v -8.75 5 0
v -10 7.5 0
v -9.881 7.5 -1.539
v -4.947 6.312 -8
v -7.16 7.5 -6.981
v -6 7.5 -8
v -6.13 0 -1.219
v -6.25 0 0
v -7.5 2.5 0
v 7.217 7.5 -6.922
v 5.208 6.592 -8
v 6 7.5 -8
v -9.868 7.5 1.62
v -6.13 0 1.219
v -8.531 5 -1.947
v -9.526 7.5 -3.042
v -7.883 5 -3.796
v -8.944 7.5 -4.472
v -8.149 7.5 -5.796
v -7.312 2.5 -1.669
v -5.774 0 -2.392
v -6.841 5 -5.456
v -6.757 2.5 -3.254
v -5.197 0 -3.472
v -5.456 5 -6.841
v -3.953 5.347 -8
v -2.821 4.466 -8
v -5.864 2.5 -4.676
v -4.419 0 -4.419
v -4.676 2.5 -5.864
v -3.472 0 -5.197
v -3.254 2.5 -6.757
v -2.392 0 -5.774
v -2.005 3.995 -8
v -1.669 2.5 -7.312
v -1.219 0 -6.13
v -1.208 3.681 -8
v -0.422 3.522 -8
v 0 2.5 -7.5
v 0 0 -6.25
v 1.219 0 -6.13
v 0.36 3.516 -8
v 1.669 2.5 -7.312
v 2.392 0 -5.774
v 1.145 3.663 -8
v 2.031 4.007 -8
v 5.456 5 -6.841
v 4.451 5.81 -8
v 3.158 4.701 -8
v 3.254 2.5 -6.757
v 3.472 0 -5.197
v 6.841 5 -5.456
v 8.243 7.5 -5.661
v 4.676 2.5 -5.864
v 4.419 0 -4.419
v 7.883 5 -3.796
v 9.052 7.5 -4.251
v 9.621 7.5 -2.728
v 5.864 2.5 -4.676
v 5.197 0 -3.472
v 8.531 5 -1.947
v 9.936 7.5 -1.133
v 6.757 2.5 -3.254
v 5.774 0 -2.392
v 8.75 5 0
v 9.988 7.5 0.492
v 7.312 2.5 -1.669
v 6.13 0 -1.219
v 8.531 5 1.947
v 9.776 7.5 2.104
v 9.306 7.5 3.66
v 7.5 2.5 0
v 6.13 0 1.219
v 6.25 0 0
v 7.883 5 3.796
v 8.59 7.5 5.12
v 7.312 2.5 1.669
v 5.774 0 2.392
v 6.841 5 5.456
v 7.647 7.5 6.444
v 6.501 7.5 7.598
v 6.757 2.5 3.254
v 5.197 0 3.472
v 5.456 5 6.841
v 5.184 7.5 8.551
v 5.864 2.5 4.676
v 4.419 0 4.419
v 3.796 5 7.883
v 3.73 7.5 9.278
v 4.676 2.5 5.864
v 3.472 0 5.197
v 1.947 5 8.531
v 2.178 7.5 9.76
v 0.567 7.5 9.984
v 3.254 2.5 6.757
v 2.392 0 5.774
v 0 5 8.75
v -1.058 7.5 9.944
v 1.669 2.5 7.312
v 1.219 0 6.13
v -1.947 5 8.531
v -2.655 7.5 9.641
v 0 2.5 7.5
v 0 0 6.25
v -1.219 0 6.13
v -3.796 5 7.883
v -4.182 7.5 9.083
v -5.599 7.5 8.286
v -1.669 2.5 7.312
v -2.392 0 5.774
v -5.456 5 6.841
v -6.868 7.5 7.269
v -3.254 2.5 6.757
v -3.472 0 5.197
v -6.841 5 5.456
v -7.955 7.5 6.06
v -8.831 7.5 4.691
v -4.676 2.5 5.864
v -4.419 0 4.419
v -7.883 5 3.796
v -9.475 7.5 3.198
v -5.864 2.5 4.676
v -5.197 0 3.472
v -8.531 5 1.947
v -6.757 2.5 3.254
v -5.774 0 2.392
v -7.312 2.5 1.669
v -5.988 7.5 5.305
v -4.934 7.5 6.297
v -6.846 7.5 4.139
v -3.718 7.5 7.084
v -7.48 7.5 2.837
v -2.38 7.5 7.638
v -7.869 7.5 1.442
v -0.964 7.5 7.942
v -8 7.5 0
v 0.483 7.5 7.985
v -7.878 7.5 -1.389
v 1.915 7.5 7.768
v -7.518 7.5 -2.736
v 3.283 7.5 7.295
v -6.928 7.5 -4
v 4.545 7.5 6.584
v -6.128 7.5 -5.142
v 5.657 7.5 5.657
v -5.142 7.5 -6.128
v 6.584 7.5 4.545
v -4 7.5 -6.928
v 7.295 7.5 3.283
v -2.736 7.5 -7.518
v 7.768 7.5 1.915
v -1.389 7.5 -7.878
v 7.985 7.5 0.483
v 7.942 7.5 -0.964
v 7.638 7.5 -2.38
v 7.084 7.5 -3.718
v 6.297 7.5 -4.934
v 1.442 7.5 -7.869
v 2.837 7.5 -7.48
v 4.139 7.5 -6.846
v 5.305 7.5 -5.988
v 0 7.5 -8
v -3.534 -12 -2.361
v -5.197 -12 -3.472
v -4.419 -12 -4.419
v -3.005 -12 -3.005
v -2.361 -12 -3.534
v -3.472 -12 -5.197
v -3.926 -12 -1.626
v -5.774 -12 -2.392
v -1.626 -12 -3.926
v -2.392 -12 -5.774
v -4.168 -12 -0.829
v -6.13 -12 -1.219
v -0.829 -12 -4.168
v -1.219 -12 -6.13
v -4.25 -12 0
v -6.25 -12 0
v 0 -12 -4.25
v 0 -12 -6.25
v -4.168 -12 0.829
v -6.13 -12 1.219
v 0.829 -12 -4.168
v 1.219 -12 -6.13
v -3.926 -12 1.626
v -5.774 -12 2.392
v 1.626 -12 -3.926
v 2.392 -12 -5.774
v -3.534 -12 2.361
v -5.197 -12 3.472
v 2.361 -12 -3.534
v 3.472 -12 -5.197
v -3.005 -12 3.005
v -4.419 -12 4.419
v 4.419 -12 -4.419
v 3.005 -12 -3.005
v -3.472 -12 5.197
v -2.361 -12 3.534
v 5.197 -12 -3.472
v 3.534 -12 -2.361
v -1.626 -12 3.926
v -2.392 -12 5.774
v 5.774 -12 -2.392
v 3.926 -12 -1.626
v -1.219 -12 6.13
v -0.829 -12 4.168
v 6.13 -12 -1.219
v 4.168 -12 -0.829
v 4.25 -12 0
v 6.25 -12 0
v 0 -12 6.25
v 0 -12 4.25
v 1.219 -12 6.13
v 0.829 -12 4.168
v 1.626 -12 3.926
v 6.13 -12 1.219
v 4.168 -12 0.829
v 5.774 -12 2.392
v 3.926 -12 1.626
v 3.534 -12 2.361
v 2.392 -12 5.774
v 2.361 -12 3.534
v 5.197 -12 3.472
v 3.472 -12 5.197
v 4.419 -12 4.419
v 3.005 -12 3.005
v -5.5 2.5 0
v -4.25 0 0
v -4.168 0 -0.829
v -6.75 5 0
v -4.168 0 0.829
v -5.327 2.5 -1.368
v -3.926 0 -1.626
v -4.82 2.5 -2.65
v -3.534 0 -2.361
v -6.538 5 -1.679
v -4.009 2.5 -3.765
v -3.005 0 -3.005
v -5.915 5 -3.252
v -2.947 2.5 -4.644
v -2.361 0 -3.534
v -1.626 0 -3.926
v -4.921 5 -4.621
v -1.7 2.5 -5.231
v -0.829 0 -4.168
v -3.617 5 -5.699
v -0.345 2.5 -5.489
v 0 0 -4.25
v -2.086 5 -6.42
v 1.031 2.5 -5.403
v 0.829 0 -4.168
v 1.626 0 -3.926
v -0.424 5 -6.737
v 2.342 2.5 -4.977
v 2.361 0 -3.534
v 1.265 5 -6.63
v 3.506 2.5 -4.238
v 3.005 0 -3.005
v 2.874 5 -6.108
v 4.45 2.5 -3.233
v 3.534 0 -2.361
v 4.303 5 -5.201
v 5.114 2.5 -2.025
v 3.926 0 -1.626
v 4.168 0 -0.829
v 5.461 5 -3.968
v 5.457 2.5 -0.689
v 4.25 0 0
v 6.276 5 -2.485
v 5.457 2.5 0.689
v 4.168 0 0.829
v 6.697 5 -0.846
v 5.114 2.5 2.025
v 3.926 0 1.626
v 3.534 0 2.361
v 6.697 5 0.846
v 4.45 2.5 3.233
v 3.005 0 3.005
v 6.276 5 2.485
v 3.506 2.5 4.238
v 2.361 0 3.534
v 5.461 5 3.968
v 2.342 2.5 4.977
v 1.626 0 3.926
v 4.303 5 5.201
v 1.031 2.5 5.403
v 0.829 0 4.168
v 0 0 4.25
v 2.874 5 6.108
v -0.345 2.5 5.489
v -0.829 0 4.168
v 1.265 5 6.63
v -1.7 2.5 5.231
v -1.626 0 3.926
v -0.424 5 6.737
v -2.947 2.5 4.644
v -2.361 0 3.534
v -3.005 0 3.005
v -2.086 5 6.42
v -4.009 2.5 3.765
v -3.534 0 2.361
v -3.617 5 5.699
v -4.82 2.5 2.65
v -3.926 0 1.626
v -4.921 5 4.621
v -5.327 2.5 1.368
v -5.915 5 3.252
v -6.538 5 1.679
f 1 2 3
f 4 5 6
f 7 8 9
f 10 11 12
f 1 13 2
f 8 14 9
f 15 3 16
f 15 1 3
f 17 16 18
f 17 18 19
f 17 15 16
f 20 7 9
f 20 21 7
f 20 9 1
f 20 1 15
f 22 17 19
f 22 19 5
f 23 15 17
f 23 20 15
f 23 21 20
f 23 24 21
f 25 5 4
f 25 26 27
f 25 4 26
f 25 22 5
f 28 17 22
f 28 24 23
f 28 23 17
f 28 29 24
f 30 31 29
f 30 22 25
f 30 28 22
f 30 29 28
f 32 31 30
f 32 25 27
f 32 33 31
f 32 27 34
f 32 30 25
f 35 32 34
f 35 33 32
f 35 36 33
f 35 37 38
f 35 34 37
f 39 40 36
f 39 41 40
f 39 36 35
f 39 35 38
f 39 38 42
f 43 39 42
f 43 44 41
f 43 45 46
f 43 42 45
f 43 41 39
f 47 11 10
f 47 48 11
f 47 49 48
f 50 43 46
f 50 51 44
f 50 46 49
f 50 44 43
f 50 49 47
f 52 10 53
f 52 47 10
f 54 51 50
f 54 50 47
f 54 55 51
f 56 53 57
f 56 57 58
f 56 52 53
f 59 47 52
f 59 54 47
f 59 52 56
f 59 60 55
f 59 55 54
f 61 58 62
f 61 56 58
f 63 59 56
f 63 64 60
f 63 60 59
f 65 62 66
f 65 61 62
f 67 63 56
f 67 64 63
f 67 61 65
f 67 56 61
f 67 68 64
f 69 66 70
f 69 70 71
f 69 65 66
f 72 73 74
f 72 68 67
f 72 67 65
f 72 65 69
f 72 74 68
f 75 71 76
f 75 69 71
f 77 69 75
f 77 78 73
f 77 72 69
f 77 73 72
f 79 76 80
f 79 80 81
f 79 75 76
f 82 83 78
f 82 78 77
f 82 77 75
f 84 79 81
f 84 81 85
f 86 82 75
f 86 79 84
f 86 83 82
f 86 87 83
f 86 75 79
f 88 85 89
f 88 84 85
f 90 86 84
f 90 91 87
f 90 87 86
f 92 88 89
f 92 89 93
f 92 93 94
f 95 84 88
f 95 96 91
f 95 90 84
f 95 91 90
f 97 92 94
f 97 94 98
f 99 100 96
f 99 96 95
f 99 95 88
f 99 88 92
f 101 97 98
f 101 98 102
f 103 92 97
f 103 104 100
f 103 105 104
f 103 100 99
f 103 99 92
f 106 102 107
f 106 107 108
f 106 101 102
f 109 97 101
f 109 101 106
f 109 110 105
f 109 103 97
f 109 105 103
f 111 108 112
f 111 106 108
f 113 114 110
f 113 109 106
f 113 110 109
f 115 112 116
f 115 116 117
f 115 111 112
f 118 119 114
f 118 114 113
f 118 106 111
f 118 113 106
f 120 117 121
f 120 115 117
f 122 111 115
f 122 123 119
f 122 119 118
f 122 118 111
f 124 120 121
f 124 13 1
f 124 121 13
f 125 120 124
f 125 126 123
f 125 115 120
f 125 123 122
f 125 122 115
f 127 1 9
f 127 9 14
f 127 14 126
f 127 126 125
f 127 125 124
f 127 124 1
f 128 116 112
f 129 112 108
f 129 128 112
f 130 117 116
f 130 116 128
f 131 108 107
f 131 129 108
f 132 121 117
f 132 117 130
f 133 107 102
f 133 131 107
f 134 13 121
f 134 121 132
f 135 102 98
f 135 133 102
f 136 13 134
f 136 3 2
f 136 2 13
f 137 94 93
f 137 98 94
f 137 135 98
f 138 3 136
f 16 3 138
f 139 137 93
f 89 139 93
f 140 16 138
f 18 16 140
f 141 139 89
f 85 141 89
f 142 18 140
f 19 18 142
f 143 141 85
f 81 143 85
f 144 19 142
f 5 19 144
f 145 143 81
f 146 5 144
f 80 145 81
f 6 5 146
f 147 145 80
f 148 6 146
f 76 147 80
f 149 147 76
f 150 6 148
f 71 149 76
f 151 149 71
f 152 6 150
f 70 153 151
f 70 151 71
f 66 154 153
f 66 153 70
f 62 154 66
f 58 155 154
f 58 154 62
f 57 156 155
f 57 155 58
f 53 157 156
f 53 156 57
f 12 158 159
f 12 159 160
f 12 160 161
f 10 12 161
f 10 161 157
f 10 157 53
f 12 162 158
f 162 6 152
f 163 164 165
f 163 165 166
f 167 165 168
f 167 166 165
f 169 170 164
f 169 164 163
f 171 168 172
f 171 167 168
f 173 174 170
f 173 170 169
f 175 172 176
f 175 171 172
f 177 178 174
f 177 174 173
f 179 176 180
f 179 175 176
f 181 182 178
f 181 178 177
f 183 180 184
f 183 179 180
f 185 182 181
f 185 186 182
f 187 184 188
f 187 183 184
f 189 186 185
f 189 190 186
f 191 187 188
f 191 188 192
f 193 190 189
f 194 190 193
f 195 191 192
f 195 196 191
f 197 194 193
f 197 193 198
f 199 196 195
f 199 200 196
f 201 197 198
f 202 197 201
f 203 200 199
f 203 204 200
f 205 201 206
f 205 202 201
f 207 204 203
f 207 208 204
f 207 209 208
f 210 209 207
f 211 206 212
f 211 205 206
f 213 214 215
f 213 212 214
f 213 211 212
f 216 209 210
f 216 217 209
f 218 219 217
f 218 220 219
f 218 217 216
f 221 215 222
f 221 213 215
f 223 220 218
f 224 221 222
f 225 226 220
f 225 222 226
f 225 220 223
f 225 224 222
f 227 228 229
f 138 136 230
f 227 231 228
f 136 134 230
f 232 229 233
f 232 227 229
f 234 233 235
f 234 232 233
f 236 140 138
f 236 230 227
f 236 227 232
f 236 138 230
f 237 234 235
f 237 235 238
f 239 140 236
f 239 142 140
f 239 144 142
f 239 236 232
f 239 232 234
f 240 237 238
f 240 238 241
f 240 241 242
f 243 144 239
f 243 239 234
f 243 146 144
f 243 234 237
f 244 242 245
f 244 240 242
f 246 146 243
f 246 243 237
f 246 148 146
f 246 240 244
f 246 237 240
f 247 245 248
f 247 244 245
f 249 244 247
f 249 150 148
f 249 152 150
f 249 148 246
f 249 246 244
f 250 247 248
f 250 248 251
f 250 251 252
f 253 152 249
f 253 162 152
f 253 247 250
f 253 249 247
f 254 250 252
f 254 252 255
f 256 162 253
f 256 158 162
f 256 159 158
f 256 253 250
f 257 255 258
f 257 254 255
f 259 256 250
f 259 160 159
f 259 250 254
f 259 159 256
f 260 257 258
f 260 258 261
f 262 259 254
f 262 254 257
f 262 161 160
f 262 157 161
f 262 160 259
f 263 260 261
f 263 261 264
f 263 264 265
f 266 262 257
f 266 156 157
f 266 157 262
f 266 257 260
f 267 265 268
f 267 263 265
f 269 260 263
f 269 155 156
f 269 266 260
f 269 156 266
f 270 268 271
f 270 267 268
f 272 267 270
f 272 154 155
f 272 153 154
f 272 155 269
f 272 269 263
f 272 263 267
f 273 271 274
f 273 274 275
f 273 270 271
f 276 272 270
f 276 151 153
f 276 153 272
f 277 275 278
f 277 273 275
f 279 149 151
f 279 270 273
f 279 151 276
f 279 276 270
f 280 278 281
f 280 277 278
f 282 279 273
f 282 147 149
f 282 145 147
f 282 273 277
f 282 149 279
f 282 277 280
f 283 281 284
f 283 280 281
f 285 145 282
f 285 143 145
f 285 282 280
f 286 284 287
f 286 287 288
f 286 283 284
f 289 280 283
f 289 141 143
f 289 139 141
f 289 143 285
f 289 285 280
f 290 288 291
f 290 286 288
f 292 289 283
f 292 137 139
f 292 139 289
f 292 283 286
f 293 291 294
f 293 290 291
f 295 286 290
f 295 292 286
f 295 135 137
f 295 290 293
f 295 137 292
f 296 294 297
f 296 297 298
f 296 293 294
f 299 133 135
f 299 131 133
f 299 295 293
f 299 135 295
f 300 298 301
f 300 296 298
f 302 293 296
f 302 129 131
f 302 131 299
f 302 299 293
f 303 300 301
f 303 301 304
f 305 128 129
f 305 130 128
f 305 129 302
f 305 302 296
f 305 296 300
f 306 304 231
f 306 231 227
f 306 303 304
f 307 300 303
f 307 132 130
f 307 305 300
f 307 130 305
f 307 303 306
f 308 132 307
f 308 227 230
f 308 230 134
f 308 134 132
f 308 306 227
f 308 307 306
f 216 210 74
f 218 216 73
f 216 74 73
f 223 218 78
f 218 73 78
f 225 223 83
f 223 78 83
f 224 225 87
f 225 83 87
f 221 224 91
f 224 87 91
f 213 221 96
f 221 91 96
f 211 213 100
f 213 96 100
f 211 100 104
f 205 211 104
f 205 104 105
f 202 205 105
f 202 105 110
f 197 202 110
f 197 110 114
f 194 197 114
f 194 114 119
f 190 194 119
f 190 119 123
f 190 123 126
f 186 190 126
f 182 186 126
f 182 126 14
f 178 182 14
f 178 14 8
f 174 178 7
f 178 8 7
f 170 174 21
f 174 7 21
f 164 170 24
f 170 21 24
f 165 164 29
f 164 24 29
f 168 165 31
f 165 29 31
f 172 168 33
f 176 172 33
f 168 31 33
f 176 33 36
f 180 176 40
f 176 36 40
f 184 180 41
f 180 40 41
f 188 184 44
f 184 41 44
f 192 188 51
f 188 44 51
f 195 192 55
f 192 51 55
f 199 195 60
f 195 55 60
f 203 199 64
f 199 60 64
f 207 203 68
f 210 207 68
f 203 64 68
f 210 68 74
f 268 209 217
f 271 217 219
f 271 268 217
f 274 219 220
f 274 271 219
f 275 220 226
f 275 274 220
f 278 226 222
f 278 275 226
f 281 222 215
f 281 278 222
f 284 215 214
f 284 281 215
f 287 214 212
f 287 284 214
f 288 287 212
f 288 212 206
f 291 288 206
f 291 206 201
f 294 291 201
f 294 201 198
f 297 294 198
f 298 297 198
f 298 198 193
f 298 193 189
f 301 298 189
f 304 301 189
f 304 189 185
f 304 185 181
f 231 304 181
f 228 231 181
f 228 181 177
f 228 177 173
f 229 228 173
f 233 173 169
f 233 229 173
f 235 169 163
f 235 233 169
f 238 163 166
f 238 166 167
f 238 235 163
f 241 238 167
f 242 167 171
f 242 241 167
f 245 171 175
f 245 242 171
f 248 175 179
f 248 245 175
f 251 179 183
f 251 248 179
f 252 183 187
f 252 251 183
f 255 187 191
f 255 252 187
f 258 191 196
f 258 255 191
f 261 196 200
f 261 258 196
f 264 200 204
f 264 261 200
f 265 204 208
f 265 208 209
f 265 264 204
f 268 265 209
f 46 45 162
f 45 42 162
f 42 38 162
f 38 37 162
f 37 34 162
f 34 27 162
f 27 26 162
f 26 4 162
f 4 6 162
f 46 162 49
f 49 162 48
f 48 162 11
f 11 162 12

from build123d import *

# Parameters (mm, degrees)
CROQUIS3_R              = 6.25
CROQUIS3_R_2            = 4.25
SALIENTE_EXTRUIR1_DEPTH = 12
CORTAR_EXTRUIR1_DEPTH   = 10


with BuildPart() as part:
    # Croquis2 → Revolución1 (revolve)
    with BuildSketch(Plane.XY):
        Polygon((-4.25, 0), (-8, 7.5), (-10, 7.5), (-6.25, 0), align=None)
    revolve(axis=Axis((0, 7.5, 0), (0, -1, 0)))

    # Croquis3 → Saliente-Extruir1 (add)
    with BuildSketch(Plane.XZ):
        Circle(CROQUIS3_R)
        Circle(CROQUIS3_R_2, mode=Mode.SUBTRACT)
    extrude(amount=SALIENTE_EXTRUIR1_DEPTH)

    # Croquis4 → Cortar-Extruir1 (cut)
    with BuildSketch(Plane(origin=(0, 7.5, 0), x_dir=(1, 0, 0), z_dir=(0, 1, 0))):
        Polygon((-10.977061444, 8), (10.977061444, 8), (0, 12.60914387), align=None)
    extrude(amount=-CORTAR_EXTRUIR1_DEPTH, mode=Mode.SUBTRACT)


solid = part.part
